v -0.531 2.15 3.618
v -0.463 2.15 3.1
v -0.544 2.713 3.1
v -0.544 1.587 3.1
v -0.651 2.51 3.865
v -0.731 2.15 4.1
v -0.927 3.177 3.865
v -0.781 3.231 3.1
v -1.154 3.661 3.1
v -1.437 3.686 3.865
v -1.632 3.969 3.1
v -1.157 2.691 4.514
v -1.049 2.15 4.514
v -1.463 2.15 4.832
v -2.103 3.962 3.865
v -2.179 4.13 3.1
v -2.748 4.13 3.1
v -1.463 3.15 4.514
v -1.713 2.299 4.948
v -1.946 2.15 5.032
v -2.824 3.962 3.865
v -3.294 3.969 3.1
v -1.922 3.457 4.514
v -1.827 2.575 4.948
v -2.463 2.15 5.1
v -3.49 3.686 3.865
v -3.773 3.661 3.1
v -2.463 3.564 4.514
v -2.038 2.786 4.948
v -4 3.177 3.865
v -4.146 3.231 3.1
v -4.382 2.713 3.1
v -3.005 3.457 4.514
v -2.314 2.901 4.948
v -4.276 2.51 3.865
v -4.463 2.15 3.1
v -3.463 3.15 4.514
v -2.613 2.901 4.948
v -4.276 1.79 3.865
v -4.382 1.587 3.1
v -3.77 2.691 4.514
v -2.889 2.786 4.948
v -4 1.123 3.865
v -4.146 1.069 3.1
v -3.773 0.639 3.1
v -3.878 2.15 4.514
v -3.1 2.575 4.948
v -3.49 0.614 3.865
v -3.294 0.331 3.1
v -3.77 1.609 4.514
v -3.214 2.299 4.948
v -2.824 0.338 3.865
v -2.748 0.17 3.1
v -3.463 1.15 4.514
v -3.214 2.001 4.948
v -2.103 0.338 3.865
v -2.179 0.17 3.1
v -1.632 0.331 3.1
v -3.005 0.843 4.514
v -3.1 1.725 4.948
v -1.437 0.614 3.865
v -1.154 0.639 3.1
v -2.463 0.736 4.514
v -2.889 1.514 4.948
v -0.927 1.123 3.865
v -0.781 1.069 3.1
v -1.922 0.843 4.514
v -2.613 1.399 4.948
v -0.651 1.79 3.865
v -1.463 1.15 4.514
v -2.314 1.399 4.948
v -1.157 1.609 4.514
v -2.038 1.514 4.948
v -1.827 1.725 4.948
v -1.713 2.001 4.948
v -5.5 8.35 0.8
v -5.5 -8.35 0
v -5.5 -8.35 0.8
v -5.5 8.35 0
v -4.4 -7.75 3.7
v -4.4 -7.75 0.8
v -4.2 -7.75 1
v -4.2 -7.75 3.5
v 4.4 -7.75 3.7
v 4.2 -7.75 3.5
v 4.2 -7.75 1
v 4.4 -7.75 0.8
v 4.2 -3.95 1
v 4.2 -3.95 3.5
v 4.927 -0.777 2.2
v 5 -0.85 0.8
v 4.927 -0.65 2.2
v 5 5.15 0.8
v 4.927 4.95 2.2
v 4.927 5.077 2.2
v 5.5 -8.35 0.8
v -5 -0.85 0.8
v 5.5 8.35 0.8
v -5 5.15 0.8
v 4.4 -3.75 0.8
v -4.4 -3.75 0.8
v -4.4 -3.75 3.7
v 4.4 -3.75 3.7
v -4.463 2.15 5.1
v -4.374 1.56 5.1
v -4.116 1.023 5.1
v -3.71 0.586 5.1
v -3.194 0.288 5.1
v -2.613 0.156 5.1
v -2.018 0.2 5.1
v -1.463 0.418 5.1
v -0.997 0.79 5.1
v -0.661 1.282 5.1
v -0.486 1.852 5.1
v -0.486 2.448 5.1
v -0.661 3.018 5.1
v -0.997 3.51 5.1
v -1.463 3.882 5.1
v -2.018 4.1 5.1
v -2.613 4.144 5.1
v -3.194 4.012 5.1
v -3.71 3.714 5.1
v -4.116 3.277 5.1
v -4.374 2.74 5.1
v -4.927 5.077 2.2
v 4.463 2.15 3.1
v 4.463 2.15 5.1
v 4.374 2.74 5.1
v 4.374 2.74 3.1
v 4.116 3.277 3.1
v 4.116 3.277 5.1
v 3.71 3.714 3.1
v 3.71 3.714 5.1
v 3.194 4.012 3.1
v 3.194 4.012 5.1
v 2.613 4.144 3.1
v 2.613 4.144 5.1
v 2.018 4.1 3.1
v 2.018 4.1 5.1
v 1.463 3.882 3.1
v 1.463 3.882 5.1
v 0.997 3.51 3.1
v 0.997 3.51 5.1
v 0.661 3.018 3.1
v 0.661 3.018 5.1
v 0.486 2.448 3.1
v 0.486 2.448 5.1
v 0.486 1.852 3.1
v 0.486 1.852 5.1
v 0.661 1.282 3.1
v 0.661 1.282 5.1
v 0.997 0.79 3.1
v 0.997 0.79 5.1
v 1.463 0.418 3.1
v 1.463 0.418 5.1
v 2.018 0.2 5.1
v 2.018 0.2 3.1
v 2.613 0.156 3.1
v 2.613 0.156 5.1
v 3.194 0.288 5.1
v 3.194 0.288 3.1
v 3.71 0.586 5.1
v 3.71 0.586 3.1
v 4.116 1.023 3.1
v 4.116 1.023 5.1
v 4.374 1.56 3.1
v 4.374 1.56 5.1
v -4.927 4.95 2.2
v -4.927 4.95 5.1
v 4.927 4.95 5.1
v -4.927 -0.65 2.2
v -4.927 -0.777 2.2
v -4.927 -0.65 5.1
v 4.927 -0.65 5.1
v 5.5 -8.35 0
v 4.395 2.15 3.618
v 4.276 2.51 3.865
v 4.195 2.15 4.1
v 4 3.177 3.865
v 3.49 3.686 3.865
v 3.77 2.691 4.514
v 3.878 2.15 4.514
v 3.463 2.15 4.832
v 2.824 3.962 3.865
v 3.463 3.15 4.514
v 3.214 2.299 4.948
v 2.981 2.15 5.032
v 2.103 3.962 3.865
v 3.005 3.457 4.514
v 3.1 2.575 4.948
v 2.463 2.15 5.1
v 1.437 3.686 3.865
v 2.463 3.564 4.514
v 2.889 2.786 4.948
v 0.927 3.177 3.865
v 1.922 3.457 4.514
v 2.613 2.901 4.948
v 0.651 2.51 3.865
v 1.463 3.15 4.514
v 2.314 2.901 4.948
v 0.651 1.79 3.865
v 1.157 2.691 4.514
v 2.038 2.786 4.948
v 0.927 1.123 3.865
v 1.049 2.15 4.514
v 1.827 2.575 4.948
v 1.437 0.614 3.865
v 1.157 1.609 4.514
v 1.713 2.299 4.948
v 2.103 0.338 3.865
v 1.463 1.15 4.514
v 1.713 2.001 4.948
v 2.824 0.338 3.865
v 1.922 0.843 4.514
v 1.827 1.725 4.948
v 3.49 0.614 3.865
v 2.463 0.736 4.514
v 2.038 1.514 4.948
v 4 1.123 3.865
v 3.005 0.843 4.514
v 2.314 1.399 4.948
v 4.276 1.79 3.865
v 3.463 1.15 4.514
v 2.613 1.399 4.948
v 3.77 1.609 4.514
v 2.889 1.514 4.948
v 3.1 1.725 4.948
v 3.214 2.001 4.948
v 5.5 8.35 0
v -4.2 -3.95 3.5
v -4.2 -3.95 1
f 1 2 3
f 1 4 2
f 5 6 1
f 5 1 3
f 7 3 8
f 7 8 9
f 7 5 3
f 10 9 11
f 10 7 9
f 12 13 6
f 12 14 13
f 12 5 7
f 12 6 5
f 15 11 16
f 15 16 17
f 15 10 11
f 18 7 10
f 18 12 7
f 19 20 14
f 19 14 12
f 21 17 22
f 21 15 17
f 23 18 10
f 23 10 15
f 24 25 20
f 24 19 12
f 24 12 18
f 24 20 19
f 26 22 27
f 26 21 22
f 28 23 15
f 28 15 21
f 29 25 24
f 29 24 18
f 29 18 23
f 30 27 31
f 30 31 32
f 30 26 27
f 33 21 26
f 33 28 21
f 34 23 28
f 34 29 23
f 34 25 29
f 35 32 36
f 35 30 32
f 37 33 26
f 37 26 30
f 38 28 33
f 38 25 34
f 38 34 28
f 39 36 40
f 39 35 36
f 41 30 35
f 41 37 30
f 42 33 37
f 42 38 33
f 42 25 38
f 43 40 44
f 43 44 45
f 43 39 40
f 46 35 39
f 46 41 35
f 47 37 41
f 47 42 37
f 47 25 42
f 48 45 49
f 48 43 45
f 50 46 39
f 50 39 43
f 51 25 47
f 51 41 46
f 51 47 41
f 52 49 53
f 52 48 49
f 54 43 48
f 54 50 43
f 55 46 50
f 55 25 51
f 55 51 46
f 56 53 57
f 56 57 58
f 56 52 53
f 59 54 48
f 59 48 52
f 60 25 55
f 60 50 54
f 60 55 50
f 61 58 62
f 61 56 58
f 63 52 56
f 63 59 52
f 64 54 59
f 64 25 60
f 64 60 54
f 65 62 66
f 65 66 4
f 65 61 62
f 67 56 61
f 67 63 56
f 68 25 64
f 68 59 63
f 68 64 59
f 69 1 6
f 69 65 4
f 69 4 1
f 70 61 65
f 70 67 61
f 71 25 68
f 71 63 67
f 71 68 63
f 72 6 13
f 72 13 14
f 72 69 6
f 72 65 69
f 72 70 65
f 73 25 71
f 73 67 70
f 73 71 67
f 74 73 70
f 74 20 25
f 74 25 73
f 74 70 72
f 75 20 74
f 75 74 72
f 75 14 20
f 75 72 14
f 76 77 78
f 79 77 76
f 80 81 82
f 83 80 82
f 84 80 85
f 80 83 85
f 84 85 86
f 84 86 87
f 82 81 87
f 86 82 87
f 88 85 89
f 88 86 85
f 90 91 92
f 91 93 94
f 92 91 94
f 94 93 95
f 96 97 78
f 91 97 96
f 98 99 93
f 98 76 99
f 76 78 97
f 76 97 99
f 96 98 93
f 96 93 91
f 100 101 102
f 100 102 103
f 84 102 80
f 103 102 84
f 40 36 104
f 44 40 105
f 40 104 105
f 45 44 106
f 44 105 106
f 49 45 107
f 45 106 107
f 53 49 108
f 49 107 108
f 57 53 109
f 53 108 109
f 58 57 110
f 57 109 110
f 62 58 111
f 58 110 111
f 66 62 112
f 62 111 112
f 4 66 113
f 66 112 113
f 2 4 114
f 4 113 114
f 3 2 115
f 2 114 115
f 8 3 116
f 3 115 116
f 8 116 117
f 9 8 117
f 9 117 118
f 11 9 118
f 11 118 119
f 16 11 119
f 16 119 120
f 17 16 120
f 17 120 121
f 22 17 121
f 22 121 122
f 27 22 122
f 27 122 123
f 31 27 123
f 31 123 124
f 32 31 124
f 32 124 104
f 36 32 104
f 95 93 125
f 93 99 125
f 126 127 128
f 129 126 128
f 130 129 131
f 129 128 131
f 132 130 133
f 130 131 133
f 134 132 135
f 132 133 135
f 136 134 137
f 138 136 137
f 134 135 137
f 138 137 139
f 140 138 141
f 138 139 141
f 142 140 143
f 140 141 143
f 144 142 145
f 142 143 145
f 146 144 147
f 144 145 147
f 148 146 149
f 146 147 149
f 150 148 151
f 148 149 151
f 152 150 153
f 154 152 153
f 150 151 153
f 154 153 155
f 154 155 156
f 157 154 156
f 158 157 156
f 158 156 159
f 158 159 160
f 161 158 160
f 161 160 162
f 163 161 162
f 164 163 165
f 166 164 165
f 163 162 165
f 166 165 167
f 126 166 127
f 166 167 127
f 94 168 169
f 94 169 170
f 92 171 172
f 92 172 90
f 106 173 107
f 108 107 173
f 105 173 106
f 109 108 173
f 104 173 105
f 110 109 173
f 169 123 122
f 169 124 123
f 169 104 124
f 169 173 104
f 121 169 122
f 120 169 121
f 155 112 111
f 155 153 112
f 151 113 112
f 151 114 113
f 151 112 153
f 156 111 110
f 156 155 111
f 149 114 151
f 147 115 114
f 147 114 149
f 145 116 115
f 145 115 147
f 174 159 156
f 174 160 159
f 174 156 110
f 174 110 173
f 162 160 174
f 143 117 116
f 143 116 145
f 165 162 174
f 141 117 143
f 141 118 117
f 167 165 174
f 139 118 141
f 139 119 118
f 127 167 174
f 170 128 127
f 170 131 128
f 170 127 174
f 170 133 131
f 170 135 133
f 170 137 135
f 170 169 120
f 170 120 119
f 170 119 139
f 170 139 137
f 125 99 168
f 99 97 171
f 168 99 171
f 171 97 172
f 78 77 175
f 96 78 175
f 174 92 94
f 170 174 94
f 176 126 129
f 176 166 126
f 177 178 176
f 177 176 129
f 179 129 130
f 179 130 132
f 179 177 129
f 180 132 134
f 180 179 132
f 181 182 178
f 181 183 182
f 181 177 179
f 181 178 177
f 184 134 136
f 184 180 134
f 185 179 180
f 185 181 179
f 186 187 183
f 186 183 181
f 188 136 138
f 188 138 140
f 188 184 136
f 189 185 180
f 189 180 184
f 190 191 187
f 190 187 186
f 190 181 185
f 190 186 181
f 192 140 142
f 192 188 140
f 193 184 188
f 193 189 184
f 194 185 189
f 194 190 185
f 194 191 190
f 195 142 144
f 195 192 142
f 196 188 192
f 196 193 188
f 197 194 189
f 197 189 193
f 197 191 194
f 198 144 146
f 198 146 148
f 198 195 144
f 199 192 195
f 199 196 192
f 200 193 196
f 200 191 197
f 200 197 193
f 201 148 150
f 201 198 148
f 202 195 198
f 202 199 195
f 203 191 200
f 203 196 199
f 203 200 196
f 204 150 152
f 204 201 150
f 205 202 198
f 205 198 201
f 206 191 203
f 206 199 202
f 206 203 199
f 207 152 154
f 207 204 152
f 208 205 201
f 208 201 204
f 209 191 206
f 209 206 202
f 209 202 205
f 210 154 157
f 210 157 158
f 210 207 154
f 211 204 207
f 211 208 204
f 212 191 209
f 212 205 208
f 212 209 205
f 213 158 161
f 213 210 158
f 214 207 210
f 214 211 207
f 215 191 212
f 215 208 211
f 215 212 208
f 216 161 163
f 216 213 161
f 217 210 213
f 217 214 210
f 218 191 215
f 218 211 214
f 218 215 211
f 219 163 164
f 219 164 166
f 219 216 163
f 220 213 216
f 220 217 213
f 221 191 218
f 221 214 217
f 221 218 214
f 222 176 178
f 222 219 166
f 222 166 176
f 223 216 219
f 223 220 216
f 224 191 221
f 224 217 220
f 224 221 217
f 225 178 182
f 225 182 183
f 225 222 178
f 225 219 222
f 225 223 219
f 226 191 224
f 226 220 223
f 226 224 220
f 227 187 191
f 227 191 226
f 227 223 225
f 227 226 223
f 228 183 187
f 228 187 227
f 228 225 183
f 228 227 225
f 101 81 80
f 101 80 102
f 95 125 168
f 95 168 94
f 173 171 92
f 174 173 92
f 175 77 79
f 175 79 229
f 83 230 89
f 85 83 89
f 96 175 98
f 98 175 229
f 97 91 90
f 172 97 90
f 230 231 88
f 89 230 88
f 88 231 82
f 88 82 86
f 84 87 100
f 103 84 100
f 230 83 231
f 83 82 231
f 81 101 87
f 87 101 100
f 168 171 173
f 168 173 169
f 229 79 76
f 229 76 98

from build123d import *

# Parameters (mm, degrees)
SKETCH1_W           = 11
SKETCH1_H           = 16.7
PCB_DEPTH           = 0.8
SKETCH3_W           = 10
SKETCH3_H           = 6
BOSS_EXTRUDE3_DEPTH = 1.4
BOSS_EXTRUDE3_TAPER = 3
SKETCH4_W           = 9.853258218
SKETCH4_H           = 5.6
BOSS_EXTRUDE4_DEPTH = 2.9
SKETCH5_R           = 2
CUT_EXTRUDE1_DEPTH  = 2
DOME1_FACE_RADIUS   = 2
DOME1_HEIGHT        = 2
DOME2_FACE_RADIUS   = 2
DOME2_HEIGHT        = 2
SKETCH7_W           = 8.8
SKETCH7_H           = 4
BOSS_EXTRUDE5_DEPTH = 2.9
SHELL1_T            = -0.2


with BuildPart() as part:
    # Sketch1 → PCB (new body)
    with BuildSketch(Plane.XY):
        Rectangle(SKETCH1_W, SKETCH1_H)
    extrude(amount=PCB_DEPTH)

    # Sketch3 → Boss-Extrude3 (add)
    with BuildSketch(Plane.XY.offset(0.8)):
        with Locations((0, 2.15)):
            Rectangle(SKETCH3_W, SKETCH3_H)
    extrude(amount=BOSS_EXTRUDE3_DEPTH, taper=BOSS_EXTRUDE3_TAPER)

    # Sketch4 → Boss-Extrude4 (add)
    with BuildSketch(Plane.XY.offset(2.2)):
        with Locations((0, 2.15)):
            Rectangle(SKETCH4_W, SKETCH4_H)
    extrude(amount=BOSS_EXTRUDE4_DEPTH)

    # Sketch5 → Cut-Extrude1 (cut)
    with BuildSketch(Plane.XY.offset(5.1)):
        with Locations((2.463314555, 2.15)):
            Circle(SKETCH5_R)
        with Locations(Location((-2.463314555, 2.15, 0), (0, 0, 180))):
            Circle(SKETCH5_R)
    extrude(amount=-CUT_EXTRUDE1_DEPTH, mode=Mode.SUBTRACT)

    # Dome1: a dome of height H over a round flat face of radius A is a cap of a sphere of radius (A * A + H * H) / (2 * H)
    dome1_r = (DOME1_FACE_RADIUS * DOME1_FACE_RADIUS + DOME1_HEIGHT * DOME1_HEIGHT) / (2 * DOME1_HEIGHT)
    dome1_base = Plane((2.463314555, 2.15, 3.1), z_dir=(0, 0, 1))
    with Locations(dome1_base.offset(DOME1_HEIGHT - dome1_r)):
        dome1_ball = Sphere(dome1_r, mode=Mode.PRIVATE)
    add(split(dome1_ball, bisect_by=dome1_base, keep=Keep.TOP, mode=Mode.PRIVATE))

    # Dome2: a dome of height H over a round flat face of radius A is a cap of a sphere of radius (A * A + H * H) / (2 * H)
    dome2_r = (DOME2_FACE_RADIUS * DOME2_FACE_RADIUS + DOME2_HEIGHT * DOME2_HEIGHT) / (2 * DOME2_HEIGHT)
    dome2_base = Plane((-2.463314555, 2.15, 3.1), z_dir=(0, 0, 1))
    with Locations(dome2_base.offset(DOME2_HEIGHT - dome2_r)):
        dome2_ball = Sphere(dome2_r, mode=Mode.PRIVATE)
    add(split(dome2_ball, bisect_by=dome2_base, keep=Keep.TOP, mode=Mode.PRIVATE))


with BuildPart() as body_2:
    # Sketch7 → Boss-Extrude5 (new body)
    with BuildSketch(Plane.XY.offset(0.8)):
        with Locations((0, -5.75)):
            Rectangle(SKETCH7_W, SKETCH7_H)
    extrude(amount=BOSS_EXTRUDE5_DEPTH)

    # Shell1
    shell1_openings = [body_2.faces().sort_by_distance(p)[0] for p in [
        (0, -7.75, 2.25),
    ]]
    offset(amount=SHELL1_T, openings=shell1_openings, kind=Kind.INTERSECTION)


solid = Compound([part.part, body_2.part])
